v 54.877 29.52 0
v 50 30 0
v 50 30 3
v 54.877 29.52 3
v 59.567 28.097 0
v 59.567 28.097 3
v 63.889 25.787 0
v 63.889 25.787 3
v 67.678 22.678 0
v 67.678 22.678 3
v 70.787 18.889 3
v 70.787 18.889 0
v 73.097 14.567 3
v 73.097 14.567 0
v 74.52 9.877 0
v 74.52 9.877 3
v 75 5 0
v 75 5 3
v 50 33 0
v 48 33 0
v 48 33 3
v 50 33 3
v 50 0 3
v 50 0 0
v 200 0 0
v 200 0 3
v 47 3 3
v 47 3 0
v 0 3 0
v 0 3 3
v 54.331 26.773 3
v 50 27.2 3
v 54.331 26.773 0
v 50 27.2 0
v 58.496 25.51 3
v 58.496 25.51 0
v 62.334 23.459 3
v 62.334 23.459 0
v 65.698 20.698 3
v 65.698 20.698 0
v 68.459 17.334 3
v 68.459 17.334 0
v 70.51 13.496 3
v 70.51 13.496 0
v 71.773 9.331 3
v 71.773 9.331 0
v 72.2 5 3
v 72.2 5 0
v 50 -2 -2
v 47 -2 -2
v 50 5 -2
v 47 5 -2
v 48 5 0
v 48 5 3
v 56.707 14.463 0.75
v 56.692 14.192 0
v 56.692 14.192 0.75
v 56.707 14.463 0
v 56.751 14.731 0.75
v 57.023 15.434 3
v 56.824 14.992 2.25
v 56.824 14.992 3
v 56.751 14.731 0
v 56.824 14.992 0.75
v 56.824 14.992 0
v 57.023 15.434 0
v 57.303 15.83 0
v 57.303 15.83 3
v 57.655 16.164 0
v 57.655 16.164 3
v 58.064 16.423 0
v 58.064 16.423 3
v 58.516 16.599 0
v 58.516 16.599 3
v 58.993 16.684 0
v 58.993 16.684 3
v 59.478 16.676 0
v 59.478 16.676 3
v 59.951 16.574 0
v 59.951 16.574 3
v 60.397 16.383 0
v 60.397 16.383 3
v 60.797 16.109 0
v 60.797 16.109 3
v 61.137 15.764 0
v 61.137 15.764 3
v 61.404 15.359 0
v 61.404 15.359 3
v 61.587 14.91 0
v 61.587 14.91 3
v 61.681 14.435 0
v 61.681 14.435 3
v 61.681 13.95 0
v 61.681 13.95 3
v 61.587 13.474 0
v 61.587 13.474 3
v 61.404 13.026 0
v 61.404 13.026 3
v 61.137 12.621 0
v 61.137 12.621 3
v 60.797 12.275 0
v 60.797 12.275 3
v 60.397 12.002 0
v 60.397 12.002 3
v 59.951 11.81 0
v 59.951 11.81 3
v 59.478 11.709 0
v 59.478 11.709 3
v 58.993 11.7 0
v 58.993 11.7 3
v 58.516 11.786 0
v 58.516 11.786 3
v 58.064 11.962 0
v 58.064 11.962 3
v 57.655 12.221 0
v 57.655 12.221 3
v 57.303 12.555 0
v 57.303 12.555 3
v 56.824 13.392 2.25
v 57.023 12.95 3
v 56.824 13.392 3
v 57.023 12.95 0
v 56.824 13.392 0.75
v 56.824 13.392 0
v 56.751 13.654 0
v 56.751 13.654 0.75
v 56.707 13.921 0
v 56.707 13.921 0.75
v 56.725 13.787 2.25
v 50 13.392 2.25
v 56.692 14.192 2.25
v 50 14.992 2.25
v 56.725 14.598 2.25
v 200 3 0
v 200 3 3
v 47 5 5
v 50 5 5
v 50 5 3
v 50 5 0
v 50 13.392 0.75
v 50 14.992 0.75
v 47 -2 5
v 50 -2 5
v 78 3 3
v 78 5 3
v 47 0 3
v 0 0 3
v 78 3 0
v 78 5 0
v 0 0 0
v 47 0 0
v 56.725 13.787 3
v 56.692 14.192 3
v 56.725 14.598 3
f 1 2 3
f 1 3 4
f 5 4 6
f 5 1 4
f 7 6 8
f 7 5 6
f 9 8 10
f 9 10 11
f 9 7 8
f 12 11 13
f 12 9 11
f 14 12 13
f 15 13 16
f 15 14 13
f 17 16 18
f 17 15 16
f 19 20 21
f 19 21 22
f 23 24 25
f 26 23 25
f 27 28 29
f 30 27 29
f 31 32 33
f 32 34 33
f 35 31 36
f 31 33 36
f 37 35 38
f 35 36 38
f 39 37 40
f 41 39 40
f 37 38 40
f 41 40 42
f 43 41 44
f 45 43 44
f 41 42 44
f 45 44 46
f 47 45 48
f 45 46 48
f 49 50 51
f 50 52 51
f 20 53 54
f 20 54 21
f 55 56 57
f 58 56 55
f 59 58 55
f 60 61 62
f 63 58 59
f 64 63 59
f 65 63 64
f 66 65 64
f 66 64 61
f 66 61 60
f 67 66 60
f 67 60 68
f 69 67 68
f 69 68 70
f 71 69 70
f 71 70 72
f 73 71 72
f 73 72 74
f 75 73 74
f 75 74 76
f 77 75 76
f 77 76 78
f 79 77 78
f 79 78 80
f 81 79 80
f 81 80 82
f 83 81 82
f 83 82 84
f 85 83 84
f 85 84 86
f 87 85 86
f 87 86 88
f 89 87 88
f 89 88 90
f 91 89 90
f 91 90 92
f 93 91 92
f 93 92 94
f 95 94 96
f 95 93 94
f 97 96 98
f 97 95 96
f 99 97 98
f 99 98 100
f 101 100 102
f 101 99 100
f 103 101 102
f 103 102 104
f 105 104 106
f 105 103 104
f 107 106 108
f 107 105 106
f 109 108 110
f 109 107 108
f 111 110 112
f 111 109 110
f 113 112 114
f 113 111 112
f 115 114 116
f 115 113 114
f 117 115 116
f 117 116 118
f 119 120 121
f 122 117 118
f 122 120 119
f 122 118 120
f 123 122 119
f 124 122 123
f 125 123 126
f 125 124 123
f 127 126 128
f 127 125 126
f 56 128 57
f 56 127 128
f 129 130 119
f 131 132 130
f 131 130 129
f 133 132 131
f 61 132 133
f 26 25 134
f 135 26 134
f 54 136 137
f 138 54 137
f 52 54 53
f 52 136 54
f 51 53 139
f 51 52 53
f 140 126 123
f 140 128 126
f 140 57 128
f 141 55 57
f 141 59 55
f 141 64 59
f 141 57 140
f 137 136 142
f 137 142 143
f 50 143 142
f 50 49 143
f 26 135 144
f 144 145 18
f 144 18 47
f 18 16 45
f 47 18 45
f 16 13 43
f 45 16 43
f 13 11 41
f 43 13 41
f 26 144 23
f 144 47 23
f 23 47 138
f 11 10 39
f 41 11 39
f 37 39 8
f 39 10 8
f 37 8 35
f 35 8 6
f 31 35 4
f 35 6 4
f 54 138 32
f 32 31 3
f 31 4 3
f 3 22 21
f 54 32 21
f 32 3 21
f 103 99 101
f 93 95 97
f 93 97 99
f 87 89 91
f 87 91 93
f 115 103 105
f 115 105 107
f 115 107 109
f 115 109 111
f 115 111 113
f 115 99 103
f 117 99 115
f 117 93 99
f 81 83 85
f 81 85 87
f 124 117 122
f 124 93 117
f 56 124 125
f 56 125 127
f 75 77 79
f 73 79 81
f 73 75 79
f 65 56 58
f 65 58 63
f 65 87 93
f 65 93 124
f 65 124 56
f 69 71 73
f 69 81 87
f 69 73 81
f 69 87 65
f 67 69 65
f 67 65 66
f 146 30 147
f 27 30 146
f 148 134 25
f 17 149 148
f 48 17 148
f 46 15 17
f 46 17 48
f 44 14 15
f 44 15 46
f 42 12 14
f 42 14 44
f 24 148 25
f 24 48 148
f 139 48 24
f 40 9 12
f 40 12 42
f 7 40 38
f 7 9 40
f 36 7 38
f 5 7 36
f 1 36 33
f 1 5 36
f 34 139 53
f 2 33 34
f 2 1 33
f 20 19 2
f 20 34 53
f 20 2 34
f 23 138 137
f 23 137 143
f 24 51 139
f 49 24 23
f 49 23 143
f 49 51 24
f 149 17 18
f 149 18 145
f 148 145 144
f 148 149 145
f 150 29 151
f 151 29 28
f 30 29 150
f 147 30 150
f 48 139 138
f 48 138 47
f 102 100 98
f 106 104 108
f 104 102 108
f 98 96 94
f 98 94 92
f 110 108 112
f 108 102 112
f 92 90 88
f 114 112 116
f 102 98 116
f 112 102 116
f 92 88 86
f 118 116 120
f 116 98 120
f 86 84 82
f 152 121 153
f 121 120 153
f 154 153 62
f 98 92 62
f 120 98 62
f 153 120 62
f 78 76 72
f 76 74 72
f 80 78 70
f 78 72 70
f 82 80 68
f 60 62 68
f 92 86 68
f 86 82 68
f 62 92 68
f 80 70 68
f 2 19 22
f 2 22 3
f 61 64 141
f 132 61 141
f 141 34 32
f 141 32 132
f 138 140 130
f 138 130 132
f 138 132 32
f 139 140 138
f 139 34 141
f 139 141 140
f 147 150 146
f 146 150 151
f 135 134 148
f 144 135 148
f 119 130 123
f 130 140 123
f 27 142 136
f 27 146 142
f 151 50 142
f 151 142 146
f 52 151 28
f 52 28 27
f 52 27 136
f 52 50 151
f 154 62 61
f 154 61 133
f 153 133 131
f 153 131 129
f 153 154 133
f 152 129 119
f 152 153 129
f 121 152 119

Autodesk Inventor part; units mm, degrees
ref_plane "YZ Plane" through (0, 0, 0) normal (1, 0, 0) x (0, 1, 0)
ref_plane "XZ Plane" through (0, 0, 0) normal (0, 1, 0) x (-1, 0, 0)
ref_plane "XY Plane" through (0, 0, 0) normal (0, 0, 1) x (1, 0, 0)
sketch "Skizze4" plane through (0, 0, 0) normal (0, 0, 1) x (1, 0, 0)
  line L0 (0, 0) -> (200, 0)
  line L1 (200, 0) -> (200, 3)
  line L2 (200, 3) -> (0, 3)
  line L3 (0, 3) -> (0, 0)
  dimension "d12" = 200
  dimension "d13" = 3
extrude "Extrusion4" add sketch "Skizze4" along normal blind 3
sketch "Skizze5" plane through (0, 0, 3) normal (0, 0, 1) x (1, 0, 0)
  line L0 (47, 5) -> (50, 5)
  line L1 (50, 5) -> (50, -2)
  line L2 (50, -2) -> (47, -2)
  line L3 (47, -2) -> (47, 5)
  line L4 (200, 0) -> (200, 3) projected
  line L5 (0, 3) -> (0, 0) projected
  line L6 (200, 3) -> (0, 3) projected
  line L7 (0, 0) -> (200, 0) projected
  dimension "d16" = 150
  dimension "d17" = 47
  dimension "d18" = 2
  dimension "d19" = 2
extrude "Extrusion5" add sketch "Skizze5" along normal blind 2 and the other way blind 5 contours L0 L1 L6 L3 | L6 L1 L7 L3 | L7 L1 L2 L3
sketch "Skizze6" plane through (0, 0, -2) normal (0, 0, -1) x (-1, 0, 0)
  point P0 (0, 0)
sketch "Skizze7" plane through (0, 0, 0) normal (0, 0, -1) x (-1, 0, 0)
  line L0 (-200, 3) -> (-50, 3) projected
  line L1 (-78, 3) -> (-50, 3)
  line L2 (-50, 3) -> (-50, 5)
  line L3 (-50, 5) -> (-78, 5)
  line L4 (-78, 5) -> (-78, 3)
  line L5 (-50, 5) -> (-48, 5)
  line L6 (-48, 5) -> (-48, 33)
  line L7 (-48, 33) -> (-50, 33)
  line L8 (-50, 33) -> (-50, 5)
  line L9 (-50, -2) -> (-50, 5) projected
  arc A0 (-50, 30) -> (-75, 5) centre (-50, 5) ccw
  arc A1 (-50, 27.2) -> (-72.2, 5) centre (-50, 5) ccw
  line L10 (-50, 5) -> (-59.1924, 14.1924)
  line L11 (-50, 5) -> (-37, 5) construction
  circle A2 centre (-59.1924, 14.1924) radius 2.5
  line L12 (-59.1924, 14.1924) -> (-50, 14.1924)
  line L13 (-59.1924, 14.1924) -> (-50, 14.1924)
  line L14 (-50, 14.1924) -> (-50, 13.3924)
  line L15 (-50, 13.3924) -> (-59.1924, 13.3924)
  line L16 (-59.1924, 13.3924) -> (-59.1924, 14.1924)
  line L17 (-50, 14.1924) -> (-59.1924, 14.1924)
  line L18 (-59.1924, 14.1924) -> (-59.1924, 14.9924)
  line L19 (-59.1924, 14.9924) -> (-50, 14.9924)
  line L20 (-50, 14.9924) -> (-50, 14.1924)
  line L21 (-50, 30) -> (-50, 27.2)
  line L22 (-75, 5) -> (-72.2, 5)
  point P0 (0, 0)
  dimension "d24" = 2
  dimension "d25" = 2
  dimension "d26" = 50
  dimension "d27" = 2.8
  dimension "d28" = 13
  dimension "d29" = 135
  dimension "d30" = 5
  dimension "d31" = 0.8
  dimension "d32" = 0.8
  dimension "d33" = 28
  dimension "d34" = 28
extrude "Extrusion6" add sketch "Skizze7" against normal blind 3 contours L4 L3 L2 L0 | L8 L7 L6 L5 | A0 L8 A1 L3 | L15 A2 L12 L8 | A2 L19 L18 L16 L15 L10 | L10 L15 A2 | L12 A2 L19 L8 | L15 L10 L12 A2 | L15 L16 L10 | A2 L12 L18 L19
sketch "Skizze8" plane through (0, 0, 0) normal (0, 0, -1) x (-1, 0, 0)
  arc A0 (-56.8238, 14.9924) -> (-56.8238, 13.3924) centre (-59.1924, 14.1924) ccw projected
  circle A1 centre (-59.1924, 14.1924) radius 2.5
  line L0 (-56.8238, 13.3924) -> (-50, 13.3924) projected
  line L1 (-56.8238, 13.3924) -> (-50, 13.3924)
  line L2 (-50, 13.3924) -> (-50, 14.9924)
  line L3 (-56.8238, 14.9924) -> (-50, 14.9924) projected
  line L4 (-50, 14.9924) -> (-56.8238, 14.9924)
  point P0 (0, 0)
extrude "Extrusion7" cut sketch "Skizze8" against normal blind 0.75 contours L3 L2 L0 A1
sketch "Skizze9" plane through (0, 0, 3) normal (0, 0, 1) x (1, 0, 0)
  arc A0 (56.8238, 13.3924) -> (56.8238, 14.9924) centre (59.1924, 14.1924) ccw projected
  circle A1 centre (59.1924, 14.1924) radius 2.5
  line L0 (50, 14.9924) -> (50, 27.2) projected
  line L1 (56.8238, 14.9924) -> (50, 14.9924)
  line L2 (50, 14.9924) -> (50, 13.3924) projected
  line L3 (50, 14.9924) -> (50, 13.3924)
  line L4 (50, 13.3924) -> (56.8238, 13.3924)
  point P0 (0, 0)
extrude "Extrusion8" cut sketch "Skizze9" against normal blind 0.75 contours L4 L2 L1 A1
properties part number "MiddleStick"
